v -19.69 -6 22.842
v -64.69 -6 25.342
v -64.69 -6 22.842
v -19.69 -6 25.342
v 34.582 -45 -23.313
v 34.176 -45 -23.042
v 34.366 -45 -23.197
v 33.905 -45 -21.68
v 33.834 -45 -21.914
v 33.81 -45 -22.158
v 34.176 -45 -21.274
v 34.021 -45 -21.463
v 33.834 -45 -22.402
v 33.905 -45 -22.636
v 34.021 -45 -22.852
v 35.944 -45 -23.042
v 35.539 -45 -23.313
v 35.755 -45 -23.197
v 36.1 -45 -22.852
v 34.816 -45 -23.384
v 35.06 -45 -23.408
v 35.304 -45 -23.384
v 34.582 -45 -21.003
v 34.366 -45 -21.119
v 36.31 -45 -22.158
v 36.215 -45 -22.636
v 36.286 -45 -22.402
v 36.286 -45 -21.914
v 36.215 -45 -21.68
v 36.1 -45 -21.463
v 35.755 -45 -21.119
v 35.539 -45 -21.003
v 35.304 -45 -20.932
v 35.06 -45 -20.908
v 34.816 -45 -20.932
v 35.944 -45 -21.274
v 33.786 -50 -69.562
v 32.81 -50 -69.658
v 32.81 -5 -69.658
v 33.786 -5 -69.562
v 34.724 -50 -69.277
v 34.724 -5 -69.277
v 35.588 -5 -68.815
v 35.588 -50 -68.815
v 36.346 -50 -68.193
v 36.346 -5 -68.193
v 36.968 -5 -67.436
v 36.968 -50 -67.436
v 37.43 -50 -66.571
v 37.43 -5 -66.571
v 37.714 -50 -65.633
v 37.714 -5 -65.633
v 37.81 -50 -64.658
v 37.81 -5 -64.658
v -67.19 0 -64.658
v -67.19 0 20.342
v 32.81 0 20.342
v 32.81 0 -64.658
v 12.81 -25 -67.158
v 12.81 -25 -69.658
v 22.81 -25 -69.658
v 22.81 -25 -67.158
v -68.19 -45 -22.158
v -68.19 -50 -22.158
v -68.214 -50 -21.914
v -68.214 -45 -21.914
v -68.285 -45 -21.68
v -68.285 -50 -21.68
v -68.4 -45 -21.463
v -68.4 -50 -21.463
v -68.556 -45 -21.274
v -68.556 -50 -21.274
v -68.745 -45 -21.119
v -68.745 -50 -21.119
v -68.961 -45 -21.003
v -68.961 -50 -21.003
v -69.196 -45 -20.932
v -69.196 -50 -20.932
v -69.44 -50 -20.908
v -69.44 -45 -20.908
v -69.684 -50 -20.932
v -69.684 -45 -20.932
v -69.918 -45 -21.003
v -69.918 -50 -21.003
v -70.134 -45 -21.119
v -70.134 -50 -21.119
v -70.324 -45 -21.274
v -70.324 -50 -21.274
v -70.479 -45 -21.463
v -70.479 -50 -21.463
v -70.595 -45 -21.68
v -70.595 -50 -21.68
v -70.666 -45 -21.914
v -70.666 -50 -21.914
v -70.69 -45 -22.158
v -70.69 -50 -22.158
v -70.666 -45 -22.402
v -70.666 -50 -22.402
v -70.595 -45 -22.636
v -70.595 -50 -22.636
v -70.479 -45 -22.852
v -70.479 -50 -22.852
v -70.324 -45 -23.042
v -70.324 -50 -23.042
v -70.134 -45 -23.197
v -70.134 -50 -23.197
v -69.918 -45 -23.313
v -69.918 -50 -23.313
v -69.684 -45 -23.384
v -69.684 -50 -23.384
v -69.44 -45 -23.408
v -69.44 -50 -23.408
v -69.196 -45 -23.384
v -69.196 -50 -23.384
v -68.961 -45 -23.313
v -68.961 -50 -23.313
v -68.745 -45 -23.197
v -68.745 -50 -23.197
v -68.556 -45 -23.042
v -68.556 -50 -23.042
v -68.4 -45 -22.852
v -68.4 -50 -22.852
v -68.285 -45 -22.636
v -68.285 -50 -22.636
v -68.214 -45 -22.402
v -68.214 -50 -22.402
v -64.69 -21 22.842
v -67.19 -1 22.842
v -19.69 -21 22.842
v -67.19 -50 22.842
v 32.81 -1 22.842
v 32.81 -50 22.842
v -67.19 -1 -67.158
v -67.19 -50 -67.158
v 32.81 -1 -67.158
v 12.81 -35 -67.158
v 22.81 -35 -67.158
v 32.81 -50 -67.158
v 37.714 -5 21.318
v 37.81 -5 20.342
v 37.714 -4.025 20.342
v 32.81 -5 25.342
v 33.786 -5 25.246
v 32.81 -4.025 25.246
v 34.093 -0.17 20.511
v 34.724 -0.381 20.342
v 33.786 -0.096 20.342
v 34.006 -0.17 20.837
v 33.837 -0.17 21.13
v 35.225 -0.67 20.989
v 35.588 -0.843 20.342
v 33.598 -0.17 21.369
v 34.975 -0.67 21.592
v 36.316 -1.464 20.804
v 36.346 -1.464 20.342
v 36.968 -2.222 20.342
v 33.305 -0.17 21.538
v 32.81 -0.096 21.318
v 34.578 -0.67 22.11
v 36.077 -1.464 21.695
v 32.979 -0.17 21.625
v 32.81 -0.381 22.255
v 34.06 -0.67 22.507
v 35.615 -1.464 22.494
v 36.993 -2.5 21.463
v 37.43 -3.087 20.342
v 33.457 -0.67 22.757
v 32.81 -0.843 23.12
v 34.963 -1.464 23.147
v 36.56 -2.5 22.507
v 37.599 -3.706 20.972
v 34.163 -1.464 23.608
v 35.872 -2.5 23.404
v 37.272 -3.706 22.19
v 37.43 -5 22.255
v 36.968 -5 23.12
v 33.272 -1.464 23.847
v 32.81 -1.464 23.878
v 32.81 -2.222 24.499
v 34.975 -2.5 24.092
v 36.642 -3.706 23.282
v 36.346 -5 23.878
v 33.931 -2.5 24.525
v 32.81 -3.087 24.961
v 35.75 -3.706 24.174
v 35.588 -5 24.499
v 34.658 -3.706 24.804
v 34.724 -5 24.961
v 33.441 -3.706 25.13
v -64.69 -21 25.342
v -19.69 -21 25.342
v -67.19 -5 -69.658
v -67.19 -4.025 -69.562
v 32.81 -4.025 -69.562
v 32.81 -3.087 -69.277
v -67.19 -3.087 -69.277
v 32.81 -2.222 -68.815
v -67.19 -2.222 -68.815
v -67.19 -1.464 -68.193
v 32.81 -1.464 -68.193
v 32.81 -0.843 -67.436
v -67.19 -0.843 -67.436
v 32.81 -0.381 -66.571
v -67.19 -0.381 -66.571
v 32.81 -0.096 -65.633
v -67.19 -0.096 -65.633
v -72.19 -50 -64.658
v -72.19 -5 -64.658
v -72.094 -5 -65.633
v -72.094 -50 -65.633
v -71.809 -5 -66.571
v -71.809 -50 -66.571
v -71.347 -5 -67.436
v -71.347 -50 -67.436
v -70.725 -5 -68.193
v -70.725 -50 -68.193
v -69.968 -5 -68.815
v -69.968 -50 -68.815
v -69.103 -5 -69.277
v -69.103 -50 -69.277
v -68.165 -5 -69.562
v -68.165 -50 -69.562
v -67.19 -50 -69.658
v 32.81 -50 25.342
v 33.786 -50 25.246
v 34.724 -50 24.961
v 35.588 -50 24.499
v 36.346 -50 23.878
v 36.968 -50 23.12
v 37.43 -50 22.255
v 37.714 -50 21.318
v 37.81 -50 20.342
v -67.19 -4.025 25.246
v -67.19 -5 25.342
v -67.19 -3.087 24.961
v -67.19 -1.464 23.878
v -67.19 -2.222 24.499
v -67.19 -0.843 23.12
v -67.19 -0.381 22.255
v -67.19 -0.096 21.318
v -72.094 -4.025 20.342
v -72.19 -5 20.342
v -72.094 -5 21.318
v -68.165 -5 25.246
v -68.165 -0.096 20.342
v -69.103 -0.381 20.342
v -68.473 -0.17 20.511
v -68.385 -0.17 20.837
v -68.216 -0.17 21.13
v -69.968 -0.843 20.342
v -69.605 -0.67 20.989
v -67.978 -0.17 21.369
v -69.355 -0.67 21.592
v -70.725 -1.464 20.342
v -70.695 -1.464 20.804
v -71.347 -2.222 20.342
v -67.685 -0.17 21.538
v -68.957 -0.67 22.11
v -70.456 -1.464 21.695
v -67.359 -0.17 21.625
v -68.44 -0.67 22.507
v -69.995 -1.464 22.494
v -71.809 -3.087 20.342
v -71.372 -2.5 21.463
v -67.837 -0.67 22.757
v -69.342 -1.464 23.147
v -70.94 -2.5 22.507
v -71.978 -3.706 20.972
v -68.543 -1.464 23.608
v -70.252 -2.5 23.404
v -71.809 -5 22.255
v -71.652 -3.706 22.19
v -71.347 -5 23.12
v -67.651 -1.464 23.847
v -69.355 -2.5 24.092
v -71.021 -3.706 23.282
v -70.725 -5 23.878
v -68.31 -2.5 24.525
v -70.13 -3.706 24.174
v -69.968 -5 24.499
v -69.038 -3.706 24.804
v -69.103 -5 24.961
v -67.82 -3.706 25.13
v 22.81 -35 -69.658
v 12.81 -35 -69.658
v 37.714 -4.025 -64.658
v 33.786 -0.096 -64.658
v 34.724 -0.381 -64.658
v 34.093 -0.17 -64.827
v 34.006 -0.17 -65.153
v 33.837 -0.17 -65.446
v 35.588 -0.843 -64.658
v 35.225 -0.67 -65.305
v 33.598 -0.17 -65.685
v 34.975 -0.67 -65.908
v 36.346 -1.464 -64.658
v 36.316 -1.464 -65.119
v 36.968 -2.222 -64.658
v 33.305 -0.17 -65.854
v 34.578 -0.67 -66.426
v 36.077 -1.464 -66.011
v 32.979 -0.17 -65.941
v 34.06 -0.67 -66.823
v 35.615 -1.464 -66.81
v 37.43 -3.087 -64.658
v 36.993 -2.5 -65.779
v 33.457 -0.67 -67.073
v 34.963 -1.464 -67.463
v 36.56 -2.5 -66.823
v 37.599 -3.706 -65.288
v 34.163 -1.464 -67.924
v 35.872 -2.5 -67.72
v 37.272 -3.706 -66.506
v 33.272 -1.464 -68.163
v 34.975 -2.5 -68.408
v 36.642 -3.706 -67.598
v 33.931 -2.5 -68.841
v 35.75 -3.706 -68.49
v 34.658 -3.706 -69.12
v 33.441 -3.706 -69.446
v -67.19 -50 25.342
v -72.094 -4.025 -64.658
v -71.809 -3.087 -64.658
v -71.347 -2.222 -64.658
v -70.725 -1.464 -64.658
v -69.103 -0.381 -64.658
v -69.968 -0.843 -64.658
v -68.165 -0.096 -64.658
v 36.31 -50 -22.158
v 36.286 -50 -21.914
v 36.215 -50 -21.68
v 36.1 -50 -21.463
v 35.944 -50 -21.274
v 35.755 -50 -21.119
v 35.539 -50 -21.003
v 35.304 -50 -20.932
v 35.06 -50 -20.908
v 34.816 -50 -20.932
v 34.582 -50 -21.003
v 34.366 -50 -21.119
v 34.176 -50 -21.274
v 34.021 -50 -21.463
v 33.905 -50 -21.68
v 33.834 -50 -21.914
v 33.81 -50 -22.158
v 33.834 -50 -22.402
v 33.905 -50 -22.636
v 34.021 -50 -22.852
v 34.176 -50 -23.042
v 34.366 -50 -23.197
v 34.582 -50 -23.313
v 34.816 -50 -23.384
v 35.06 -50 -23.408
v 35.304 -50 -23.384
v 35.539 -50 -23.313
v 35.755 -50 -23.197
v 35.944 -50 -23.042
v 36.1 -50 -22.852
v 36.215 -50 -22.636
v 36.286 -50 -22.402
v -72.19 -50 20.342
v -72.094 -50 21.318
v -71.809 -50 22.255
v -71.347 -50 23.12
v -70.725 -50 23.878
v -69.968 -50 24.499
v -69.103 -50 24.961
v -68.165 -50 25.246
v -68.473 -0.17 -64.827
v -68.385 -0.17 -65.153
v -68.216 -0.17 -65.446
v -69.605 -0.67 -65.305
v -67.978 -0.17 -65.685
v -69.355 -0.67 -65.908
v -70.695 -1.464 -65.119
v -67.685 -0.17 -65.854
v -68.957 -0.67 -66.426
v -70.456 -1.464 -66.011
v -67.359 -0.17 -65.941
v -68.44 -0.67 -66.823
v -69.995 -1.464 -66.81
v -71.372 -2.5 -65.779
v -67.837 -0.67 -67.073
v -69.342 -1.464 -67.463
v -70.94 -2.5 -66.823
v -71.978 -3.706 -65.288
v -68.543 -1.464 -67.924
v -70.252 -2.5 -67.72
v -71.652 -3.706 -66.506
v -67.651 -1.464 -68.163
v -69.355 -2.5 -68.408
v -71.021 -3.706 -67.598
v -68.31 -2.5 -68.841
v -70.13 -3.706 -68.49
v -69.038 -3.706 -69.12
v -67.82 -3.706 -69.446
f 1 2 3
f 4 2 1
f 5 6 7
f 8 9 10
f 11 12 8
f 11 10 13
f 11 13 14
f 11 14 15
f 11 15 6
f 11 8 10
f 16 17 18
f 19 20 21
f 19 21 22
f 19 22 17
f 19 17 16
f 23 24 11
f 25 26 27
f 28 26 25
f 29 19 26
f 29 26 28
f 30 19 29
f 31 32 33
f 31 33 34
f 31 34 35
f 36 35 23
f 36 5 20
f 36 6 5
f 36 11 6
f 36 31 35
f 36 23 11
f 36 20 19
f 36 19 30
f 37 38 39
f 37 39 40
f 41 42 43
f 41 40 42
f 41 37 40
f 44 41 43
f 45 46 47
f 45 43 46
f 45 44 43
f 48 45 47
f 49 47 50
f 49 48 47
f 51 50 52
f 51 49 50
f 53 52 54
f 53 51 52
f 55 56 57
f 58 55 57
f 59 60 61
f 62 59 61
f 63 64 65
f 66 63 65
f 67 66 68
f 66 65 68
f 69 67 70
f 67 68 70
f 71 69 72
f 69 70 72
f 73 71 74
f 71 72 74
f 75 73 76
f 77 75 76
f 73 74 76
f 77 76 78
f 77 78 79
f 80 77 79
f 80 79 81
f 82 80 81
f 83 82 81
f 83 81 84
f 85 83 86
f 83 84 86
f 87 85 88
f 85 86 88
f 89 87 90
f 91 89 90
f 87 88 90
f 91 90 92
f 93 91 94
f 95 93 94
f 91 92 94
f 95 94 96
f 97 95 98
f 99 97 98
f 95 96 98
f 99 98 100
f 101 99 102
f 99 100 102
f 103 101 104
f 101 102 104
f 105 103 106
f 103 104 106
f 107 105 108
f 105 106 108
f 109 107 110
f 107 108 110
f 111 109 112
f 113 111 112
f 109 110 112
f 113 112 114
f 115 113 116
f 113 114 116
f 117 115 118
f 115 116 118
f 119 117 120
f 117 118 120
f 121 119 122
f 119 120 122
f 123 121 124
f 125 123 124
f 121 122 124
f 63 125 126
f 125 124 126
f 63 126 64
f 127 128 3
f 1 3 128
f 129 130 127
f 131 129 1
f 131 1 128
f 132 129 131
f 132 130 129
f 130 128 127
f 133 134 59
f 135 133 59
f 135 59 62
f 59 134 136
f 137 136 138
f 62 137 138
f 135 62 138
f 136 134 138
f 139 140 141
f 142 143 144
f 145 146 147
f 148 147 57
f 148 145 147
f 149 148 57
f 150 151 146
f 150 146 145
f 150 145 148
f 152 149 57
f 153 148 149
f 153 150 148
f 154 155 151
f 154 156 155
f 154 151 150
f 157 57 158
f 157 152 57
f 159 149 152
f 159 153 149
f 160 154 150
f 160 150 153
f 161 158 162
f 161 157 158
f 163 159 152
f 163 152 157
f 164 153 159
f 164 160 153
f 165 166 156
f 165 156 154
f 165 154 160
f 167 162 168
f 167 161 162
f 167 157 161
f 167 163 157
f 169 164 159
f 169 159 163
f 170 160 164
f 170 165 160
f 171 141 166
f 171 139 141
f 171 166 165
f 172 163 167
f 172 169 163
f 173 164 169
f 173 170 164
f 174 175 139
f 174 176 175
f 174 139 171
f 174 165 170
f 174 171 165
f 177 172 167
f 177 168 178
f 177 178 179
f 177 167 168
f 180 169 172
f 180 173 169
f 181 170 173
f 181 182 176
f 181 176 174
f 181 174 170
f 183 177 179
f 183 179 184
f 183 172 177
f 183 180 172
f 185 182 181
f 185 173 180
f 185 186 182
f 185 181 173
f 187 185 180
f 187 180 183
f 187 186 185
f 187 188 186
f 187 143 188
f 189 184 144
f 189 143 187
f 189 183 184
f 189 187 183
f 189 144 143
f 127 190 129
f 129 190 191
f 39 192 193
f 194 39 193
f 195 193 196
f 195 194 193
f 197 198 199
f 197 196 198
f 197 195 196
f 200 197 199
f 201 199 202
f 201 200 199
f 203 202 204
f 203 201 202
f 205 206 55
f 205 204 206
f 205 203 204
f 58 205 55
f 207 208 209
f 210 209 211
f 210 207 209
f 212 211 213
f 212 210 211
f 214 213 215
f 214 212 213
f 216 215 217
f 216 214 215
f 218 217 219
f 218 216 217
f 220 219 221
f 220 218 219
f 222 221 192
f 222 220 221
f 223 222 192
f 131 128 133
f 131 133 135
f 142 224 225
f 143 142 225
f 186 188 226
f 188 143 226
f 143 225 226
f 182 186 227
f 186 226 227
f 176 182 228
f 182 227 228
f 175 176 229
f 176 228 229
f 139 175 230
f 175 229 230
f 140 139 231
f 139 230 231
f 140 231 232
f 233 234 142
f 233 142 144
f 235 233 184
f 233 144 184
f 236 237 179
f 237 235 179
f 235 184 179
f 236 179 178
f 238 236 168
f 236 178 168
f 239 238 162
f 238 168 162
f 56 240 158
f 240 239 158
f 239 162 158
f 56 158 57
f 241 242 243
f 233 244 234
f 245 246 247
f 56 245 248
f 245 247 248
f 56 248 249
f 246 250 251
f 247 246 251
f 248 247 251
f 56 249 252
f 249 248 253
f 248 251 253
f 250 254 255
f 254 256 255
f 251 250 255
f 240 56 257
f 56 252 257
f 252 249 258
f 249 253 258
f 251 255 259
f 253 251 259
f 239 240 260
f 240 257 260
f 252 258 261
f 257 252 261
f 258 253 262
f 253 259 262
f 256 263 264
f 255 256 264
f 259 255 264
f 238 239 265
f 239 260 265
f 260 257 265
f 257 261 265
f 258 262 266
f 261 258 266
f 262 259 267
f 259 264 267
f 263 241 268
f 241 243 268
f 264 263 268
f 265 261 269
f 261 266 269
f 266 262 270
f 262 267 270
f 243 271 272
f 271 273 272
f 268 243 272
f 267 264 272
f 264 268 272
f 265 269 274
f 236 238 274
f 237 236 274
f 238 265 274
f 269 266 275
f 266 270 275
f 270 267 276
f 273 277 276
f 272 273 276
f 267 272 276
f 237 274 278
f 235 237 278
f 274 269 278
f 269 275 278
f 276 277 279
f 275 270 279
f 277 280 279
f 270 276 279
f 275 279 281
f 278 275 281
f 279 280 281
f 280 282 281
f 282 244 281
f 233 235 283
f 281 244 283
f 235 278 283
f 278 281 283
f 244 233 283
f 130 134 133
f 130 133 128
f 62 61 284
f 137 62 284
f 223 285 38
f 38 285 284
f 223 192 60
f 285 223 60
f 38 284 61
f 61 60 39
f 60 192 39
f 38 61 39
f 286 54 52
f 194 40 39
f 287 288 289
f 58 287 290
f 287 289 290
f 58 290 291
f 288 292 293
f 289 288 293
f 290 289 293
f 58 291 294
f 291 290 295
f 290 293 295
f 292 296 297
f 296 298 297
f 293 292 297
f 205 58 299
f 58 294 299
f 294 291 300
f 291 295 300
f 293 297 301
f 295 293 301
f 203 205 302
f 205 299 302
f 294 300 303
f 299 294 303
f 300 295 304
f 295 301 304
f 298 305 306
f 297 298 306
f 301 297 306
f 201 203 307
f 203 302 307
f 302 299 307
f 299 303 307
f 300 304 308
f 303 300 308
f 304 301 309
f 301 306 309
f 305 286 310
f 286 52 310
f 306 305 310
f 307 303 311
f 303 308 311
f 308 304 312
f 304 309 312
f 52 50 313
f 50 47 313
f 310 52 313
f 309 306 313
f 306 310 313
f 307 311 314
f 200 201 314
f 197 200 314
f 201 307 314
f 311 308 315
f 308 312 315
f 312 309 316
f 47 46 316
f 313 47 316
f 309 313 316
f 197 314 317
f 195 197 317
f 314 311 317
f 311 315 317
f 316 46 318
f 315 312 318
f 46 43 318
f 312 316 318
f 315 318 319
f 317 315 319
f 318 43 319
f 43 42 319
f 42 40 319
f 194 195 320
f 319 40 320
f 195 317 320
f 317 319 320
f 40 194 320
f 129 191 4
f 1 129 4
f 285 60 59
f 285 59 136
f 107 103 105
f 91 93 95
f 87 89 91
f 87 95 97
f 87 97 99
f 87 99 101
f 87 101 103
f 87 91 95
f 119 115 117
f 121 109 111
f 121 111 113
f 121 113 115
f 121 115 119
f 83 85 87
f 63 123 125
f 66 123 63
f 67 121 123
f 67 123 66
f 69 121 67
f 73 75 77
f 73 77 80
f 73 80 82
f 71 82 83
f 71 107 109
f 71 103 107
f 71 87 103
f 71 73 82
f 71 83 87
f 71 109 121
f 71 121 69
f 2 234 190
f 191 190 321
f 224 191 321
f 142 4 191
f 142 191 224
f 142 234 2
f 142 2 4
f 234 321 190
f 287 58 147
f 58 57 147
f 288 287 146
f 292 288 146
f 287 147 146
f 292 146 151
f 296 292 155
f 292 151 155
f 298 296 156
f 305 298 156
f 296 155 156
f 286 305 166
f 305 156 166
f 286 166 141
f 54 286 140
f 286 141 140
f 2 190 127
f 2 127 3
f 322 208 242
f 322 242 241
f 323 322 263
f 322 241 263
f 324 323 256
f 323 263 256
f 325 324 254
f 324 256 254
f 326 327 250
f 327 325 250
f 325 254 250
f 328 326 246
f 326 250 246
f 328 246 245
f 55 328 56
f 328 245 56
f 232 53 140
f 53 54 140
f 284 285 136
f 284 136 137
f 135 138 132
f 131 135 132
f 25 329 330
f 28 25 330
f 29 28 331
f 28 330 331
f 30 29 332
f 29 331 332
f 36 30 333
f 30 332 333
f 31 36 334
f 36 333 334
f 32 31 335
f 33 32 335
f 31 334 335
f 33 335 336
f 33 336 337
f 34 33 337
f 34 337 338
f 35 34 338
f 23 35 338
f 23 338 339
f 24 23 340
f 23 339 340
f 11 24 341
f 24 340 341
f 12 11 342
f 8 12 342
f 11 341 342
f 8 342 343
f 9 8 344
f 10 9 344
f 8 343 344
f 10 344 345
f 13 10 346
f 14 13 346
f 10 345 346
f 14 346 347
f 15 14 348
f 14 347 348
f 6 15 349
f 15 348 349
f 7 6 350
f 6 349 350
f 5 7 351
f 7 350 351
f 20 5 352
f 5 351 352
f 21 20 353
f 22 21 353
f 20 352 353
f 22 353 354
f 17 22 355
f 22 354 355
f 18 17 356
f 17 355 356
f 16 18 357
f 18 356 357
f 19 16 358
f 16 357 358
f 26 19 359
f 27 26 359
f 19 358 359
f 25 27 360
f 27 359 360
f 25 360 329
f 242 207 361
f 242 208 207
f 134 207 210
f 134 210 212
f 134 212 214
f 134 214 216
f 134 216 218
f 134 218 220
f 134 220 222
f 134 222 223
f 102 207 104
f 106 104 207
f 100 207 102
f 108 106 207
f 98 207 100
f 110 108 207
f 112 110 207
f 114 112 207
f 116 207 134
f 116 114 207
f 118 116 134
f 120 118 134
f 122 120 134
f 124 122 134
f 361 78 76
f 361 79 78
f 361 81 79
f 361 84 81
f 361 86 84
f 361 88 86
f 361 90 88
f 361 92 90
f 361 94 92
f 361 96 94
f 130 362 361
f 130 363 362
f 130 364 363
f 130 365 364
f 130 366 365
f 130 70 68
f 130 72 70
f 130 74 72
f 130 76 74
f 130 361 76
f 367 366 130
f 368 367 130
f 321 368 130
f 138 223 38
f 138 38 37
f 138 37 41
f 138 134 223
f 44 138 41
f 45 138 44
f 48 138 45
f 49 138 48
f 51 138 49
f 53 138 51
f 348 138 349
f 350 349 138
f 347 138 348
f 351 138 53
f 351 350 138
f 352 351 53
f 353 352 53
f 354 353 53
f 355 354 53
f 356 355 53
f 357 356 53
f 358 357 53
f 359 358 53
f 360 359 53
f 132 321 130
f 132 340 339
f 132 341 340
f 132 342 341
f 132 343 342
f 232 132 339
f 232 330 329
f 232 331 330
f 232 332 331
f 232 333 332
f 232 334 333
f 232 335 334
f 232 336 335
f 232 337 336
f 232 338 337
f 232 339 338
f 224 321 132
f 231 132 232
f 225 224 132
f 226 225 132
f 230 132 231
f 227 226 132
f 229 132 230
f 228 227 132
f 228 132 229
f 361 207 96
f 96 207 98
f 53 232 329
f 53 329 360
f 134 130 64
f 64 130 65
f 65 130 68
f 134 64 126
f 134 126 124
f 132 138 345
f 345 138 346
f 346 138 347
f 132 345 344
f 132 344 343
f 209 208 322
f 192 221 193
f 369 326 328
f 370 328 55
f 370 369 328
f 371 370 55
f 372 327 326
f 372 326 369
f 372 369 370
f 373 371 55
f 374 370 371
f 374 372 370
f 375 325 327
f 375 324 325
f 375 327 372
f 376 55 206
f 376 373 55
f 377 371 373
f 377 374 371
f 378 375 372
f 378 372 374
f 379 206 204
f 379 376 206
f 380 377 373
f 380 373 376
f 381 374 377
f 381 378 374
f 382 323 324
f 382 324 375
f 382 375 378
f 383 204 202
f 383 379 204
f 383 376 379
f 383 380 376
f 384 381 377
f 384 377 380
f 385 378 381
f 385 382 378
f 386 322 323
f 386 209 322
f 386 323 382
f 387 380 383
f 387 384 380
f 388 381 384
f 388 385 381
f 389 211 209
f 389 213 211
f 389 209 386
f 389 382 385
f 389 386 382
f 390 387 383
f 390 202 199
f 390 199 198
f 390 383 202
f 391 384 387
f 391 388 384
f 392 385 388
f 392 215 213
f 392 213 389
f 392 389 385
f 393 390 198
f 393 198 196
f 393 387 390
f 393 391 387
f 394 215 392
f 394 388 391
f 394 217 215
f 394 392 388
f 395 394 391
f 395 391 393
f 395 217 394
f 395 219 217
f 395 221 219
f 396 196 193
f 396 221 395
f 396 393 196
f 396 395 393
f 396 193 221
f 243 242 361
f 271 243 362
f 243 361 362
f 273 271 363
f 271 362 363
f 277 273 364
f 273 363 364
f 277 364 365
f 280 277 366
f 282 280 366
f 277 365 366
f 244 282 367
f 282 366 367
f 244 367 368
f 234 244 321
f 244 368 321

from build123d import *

# Parameters (mm, degrees)
F0_W      = 110
F0_H      = 95
F1_DEPTH  = 50
F2_W      = 100
F2_H      = 90
F3_DEPTH  = 49
F4_R      = 1.25
F5_DEPTH  = 5
F6_R      = 5
F7_W      = 45
F7_H      = 15
F8_DEPTH  = 25
F9_W      = 10
F9_H      = 10
F10_DEPTH = 5


with BuildPart() as f1:
    # F0 (on Front) → F1 (new body)
    with BuildSketch(Plane.XZ):
        with Locations((-17.189732, -22.157951)):
            Rectangle(F0_W, F0_H)
    extrude(amount=F1_DEPTH)

    # F2 (on face) → F3 (cut)
    with BuildSketch(Plane.XZ.offset(50)):
        with Locations((-17.189732, -22.157951)):
            Rectangle(F2_W, F2_H)
    extrude(amount=-F3_DEPTH, mode=Mode.SUBTRACT)

    # F4 (on face) → F5 (cut)
    with BuildSketch(Plane.XZ.offset(50)):
        with Locations((-69.439732, -22.157951)):
            Circle(F4_R)
        with Locations((35.060268, -22.157951)):
            Circle(F4_R)
    extrude(amount=-F5_DEPTH, mode=Mode.SUBTRACT)

    # F6
    f6_edges = [f1.edges().sort_by_distance(p)[0] for p in [
        (-72.189732, -25, -69.657951),
        (-72.189732, -25, 25.342049),
        (37.810268, -25, -69.657951),
        (37.810268, -25, 25.342049),
        (37.810268, 0, -22.157951),
        (-72.189732, 0, -22.157951),
        (-17.189732, 0, -69.657951),
        (-17.189732, 0, 25.342049),
    ]]
    fillet(f6_edges, radius=F6_R)

    # F7 (on face) → F8 (cut)
    with BuildSketch(Plane.XY.offset(25.342049)):
        with Locations((-42.189732, -13.5)):
            Rectangle(F7_W, F7_H)
    extrude(amount=-F8_DEPTH, mode=Mode.SUBTRACT)

    # F9 (on face) → F10 (cut)
    with BuildSketch(Plane(origin=(0, 0, -69.657951), x_dir=(1, 0, 0), z_dir=(0, 0, -1))):
        with Locations((17.810268, 30)):
            Rectangle(F9_W, F9_H)
    extrude(amount=-F10_DEPTH, mode=Mode.SUBTRACT)


solid = f1.part
